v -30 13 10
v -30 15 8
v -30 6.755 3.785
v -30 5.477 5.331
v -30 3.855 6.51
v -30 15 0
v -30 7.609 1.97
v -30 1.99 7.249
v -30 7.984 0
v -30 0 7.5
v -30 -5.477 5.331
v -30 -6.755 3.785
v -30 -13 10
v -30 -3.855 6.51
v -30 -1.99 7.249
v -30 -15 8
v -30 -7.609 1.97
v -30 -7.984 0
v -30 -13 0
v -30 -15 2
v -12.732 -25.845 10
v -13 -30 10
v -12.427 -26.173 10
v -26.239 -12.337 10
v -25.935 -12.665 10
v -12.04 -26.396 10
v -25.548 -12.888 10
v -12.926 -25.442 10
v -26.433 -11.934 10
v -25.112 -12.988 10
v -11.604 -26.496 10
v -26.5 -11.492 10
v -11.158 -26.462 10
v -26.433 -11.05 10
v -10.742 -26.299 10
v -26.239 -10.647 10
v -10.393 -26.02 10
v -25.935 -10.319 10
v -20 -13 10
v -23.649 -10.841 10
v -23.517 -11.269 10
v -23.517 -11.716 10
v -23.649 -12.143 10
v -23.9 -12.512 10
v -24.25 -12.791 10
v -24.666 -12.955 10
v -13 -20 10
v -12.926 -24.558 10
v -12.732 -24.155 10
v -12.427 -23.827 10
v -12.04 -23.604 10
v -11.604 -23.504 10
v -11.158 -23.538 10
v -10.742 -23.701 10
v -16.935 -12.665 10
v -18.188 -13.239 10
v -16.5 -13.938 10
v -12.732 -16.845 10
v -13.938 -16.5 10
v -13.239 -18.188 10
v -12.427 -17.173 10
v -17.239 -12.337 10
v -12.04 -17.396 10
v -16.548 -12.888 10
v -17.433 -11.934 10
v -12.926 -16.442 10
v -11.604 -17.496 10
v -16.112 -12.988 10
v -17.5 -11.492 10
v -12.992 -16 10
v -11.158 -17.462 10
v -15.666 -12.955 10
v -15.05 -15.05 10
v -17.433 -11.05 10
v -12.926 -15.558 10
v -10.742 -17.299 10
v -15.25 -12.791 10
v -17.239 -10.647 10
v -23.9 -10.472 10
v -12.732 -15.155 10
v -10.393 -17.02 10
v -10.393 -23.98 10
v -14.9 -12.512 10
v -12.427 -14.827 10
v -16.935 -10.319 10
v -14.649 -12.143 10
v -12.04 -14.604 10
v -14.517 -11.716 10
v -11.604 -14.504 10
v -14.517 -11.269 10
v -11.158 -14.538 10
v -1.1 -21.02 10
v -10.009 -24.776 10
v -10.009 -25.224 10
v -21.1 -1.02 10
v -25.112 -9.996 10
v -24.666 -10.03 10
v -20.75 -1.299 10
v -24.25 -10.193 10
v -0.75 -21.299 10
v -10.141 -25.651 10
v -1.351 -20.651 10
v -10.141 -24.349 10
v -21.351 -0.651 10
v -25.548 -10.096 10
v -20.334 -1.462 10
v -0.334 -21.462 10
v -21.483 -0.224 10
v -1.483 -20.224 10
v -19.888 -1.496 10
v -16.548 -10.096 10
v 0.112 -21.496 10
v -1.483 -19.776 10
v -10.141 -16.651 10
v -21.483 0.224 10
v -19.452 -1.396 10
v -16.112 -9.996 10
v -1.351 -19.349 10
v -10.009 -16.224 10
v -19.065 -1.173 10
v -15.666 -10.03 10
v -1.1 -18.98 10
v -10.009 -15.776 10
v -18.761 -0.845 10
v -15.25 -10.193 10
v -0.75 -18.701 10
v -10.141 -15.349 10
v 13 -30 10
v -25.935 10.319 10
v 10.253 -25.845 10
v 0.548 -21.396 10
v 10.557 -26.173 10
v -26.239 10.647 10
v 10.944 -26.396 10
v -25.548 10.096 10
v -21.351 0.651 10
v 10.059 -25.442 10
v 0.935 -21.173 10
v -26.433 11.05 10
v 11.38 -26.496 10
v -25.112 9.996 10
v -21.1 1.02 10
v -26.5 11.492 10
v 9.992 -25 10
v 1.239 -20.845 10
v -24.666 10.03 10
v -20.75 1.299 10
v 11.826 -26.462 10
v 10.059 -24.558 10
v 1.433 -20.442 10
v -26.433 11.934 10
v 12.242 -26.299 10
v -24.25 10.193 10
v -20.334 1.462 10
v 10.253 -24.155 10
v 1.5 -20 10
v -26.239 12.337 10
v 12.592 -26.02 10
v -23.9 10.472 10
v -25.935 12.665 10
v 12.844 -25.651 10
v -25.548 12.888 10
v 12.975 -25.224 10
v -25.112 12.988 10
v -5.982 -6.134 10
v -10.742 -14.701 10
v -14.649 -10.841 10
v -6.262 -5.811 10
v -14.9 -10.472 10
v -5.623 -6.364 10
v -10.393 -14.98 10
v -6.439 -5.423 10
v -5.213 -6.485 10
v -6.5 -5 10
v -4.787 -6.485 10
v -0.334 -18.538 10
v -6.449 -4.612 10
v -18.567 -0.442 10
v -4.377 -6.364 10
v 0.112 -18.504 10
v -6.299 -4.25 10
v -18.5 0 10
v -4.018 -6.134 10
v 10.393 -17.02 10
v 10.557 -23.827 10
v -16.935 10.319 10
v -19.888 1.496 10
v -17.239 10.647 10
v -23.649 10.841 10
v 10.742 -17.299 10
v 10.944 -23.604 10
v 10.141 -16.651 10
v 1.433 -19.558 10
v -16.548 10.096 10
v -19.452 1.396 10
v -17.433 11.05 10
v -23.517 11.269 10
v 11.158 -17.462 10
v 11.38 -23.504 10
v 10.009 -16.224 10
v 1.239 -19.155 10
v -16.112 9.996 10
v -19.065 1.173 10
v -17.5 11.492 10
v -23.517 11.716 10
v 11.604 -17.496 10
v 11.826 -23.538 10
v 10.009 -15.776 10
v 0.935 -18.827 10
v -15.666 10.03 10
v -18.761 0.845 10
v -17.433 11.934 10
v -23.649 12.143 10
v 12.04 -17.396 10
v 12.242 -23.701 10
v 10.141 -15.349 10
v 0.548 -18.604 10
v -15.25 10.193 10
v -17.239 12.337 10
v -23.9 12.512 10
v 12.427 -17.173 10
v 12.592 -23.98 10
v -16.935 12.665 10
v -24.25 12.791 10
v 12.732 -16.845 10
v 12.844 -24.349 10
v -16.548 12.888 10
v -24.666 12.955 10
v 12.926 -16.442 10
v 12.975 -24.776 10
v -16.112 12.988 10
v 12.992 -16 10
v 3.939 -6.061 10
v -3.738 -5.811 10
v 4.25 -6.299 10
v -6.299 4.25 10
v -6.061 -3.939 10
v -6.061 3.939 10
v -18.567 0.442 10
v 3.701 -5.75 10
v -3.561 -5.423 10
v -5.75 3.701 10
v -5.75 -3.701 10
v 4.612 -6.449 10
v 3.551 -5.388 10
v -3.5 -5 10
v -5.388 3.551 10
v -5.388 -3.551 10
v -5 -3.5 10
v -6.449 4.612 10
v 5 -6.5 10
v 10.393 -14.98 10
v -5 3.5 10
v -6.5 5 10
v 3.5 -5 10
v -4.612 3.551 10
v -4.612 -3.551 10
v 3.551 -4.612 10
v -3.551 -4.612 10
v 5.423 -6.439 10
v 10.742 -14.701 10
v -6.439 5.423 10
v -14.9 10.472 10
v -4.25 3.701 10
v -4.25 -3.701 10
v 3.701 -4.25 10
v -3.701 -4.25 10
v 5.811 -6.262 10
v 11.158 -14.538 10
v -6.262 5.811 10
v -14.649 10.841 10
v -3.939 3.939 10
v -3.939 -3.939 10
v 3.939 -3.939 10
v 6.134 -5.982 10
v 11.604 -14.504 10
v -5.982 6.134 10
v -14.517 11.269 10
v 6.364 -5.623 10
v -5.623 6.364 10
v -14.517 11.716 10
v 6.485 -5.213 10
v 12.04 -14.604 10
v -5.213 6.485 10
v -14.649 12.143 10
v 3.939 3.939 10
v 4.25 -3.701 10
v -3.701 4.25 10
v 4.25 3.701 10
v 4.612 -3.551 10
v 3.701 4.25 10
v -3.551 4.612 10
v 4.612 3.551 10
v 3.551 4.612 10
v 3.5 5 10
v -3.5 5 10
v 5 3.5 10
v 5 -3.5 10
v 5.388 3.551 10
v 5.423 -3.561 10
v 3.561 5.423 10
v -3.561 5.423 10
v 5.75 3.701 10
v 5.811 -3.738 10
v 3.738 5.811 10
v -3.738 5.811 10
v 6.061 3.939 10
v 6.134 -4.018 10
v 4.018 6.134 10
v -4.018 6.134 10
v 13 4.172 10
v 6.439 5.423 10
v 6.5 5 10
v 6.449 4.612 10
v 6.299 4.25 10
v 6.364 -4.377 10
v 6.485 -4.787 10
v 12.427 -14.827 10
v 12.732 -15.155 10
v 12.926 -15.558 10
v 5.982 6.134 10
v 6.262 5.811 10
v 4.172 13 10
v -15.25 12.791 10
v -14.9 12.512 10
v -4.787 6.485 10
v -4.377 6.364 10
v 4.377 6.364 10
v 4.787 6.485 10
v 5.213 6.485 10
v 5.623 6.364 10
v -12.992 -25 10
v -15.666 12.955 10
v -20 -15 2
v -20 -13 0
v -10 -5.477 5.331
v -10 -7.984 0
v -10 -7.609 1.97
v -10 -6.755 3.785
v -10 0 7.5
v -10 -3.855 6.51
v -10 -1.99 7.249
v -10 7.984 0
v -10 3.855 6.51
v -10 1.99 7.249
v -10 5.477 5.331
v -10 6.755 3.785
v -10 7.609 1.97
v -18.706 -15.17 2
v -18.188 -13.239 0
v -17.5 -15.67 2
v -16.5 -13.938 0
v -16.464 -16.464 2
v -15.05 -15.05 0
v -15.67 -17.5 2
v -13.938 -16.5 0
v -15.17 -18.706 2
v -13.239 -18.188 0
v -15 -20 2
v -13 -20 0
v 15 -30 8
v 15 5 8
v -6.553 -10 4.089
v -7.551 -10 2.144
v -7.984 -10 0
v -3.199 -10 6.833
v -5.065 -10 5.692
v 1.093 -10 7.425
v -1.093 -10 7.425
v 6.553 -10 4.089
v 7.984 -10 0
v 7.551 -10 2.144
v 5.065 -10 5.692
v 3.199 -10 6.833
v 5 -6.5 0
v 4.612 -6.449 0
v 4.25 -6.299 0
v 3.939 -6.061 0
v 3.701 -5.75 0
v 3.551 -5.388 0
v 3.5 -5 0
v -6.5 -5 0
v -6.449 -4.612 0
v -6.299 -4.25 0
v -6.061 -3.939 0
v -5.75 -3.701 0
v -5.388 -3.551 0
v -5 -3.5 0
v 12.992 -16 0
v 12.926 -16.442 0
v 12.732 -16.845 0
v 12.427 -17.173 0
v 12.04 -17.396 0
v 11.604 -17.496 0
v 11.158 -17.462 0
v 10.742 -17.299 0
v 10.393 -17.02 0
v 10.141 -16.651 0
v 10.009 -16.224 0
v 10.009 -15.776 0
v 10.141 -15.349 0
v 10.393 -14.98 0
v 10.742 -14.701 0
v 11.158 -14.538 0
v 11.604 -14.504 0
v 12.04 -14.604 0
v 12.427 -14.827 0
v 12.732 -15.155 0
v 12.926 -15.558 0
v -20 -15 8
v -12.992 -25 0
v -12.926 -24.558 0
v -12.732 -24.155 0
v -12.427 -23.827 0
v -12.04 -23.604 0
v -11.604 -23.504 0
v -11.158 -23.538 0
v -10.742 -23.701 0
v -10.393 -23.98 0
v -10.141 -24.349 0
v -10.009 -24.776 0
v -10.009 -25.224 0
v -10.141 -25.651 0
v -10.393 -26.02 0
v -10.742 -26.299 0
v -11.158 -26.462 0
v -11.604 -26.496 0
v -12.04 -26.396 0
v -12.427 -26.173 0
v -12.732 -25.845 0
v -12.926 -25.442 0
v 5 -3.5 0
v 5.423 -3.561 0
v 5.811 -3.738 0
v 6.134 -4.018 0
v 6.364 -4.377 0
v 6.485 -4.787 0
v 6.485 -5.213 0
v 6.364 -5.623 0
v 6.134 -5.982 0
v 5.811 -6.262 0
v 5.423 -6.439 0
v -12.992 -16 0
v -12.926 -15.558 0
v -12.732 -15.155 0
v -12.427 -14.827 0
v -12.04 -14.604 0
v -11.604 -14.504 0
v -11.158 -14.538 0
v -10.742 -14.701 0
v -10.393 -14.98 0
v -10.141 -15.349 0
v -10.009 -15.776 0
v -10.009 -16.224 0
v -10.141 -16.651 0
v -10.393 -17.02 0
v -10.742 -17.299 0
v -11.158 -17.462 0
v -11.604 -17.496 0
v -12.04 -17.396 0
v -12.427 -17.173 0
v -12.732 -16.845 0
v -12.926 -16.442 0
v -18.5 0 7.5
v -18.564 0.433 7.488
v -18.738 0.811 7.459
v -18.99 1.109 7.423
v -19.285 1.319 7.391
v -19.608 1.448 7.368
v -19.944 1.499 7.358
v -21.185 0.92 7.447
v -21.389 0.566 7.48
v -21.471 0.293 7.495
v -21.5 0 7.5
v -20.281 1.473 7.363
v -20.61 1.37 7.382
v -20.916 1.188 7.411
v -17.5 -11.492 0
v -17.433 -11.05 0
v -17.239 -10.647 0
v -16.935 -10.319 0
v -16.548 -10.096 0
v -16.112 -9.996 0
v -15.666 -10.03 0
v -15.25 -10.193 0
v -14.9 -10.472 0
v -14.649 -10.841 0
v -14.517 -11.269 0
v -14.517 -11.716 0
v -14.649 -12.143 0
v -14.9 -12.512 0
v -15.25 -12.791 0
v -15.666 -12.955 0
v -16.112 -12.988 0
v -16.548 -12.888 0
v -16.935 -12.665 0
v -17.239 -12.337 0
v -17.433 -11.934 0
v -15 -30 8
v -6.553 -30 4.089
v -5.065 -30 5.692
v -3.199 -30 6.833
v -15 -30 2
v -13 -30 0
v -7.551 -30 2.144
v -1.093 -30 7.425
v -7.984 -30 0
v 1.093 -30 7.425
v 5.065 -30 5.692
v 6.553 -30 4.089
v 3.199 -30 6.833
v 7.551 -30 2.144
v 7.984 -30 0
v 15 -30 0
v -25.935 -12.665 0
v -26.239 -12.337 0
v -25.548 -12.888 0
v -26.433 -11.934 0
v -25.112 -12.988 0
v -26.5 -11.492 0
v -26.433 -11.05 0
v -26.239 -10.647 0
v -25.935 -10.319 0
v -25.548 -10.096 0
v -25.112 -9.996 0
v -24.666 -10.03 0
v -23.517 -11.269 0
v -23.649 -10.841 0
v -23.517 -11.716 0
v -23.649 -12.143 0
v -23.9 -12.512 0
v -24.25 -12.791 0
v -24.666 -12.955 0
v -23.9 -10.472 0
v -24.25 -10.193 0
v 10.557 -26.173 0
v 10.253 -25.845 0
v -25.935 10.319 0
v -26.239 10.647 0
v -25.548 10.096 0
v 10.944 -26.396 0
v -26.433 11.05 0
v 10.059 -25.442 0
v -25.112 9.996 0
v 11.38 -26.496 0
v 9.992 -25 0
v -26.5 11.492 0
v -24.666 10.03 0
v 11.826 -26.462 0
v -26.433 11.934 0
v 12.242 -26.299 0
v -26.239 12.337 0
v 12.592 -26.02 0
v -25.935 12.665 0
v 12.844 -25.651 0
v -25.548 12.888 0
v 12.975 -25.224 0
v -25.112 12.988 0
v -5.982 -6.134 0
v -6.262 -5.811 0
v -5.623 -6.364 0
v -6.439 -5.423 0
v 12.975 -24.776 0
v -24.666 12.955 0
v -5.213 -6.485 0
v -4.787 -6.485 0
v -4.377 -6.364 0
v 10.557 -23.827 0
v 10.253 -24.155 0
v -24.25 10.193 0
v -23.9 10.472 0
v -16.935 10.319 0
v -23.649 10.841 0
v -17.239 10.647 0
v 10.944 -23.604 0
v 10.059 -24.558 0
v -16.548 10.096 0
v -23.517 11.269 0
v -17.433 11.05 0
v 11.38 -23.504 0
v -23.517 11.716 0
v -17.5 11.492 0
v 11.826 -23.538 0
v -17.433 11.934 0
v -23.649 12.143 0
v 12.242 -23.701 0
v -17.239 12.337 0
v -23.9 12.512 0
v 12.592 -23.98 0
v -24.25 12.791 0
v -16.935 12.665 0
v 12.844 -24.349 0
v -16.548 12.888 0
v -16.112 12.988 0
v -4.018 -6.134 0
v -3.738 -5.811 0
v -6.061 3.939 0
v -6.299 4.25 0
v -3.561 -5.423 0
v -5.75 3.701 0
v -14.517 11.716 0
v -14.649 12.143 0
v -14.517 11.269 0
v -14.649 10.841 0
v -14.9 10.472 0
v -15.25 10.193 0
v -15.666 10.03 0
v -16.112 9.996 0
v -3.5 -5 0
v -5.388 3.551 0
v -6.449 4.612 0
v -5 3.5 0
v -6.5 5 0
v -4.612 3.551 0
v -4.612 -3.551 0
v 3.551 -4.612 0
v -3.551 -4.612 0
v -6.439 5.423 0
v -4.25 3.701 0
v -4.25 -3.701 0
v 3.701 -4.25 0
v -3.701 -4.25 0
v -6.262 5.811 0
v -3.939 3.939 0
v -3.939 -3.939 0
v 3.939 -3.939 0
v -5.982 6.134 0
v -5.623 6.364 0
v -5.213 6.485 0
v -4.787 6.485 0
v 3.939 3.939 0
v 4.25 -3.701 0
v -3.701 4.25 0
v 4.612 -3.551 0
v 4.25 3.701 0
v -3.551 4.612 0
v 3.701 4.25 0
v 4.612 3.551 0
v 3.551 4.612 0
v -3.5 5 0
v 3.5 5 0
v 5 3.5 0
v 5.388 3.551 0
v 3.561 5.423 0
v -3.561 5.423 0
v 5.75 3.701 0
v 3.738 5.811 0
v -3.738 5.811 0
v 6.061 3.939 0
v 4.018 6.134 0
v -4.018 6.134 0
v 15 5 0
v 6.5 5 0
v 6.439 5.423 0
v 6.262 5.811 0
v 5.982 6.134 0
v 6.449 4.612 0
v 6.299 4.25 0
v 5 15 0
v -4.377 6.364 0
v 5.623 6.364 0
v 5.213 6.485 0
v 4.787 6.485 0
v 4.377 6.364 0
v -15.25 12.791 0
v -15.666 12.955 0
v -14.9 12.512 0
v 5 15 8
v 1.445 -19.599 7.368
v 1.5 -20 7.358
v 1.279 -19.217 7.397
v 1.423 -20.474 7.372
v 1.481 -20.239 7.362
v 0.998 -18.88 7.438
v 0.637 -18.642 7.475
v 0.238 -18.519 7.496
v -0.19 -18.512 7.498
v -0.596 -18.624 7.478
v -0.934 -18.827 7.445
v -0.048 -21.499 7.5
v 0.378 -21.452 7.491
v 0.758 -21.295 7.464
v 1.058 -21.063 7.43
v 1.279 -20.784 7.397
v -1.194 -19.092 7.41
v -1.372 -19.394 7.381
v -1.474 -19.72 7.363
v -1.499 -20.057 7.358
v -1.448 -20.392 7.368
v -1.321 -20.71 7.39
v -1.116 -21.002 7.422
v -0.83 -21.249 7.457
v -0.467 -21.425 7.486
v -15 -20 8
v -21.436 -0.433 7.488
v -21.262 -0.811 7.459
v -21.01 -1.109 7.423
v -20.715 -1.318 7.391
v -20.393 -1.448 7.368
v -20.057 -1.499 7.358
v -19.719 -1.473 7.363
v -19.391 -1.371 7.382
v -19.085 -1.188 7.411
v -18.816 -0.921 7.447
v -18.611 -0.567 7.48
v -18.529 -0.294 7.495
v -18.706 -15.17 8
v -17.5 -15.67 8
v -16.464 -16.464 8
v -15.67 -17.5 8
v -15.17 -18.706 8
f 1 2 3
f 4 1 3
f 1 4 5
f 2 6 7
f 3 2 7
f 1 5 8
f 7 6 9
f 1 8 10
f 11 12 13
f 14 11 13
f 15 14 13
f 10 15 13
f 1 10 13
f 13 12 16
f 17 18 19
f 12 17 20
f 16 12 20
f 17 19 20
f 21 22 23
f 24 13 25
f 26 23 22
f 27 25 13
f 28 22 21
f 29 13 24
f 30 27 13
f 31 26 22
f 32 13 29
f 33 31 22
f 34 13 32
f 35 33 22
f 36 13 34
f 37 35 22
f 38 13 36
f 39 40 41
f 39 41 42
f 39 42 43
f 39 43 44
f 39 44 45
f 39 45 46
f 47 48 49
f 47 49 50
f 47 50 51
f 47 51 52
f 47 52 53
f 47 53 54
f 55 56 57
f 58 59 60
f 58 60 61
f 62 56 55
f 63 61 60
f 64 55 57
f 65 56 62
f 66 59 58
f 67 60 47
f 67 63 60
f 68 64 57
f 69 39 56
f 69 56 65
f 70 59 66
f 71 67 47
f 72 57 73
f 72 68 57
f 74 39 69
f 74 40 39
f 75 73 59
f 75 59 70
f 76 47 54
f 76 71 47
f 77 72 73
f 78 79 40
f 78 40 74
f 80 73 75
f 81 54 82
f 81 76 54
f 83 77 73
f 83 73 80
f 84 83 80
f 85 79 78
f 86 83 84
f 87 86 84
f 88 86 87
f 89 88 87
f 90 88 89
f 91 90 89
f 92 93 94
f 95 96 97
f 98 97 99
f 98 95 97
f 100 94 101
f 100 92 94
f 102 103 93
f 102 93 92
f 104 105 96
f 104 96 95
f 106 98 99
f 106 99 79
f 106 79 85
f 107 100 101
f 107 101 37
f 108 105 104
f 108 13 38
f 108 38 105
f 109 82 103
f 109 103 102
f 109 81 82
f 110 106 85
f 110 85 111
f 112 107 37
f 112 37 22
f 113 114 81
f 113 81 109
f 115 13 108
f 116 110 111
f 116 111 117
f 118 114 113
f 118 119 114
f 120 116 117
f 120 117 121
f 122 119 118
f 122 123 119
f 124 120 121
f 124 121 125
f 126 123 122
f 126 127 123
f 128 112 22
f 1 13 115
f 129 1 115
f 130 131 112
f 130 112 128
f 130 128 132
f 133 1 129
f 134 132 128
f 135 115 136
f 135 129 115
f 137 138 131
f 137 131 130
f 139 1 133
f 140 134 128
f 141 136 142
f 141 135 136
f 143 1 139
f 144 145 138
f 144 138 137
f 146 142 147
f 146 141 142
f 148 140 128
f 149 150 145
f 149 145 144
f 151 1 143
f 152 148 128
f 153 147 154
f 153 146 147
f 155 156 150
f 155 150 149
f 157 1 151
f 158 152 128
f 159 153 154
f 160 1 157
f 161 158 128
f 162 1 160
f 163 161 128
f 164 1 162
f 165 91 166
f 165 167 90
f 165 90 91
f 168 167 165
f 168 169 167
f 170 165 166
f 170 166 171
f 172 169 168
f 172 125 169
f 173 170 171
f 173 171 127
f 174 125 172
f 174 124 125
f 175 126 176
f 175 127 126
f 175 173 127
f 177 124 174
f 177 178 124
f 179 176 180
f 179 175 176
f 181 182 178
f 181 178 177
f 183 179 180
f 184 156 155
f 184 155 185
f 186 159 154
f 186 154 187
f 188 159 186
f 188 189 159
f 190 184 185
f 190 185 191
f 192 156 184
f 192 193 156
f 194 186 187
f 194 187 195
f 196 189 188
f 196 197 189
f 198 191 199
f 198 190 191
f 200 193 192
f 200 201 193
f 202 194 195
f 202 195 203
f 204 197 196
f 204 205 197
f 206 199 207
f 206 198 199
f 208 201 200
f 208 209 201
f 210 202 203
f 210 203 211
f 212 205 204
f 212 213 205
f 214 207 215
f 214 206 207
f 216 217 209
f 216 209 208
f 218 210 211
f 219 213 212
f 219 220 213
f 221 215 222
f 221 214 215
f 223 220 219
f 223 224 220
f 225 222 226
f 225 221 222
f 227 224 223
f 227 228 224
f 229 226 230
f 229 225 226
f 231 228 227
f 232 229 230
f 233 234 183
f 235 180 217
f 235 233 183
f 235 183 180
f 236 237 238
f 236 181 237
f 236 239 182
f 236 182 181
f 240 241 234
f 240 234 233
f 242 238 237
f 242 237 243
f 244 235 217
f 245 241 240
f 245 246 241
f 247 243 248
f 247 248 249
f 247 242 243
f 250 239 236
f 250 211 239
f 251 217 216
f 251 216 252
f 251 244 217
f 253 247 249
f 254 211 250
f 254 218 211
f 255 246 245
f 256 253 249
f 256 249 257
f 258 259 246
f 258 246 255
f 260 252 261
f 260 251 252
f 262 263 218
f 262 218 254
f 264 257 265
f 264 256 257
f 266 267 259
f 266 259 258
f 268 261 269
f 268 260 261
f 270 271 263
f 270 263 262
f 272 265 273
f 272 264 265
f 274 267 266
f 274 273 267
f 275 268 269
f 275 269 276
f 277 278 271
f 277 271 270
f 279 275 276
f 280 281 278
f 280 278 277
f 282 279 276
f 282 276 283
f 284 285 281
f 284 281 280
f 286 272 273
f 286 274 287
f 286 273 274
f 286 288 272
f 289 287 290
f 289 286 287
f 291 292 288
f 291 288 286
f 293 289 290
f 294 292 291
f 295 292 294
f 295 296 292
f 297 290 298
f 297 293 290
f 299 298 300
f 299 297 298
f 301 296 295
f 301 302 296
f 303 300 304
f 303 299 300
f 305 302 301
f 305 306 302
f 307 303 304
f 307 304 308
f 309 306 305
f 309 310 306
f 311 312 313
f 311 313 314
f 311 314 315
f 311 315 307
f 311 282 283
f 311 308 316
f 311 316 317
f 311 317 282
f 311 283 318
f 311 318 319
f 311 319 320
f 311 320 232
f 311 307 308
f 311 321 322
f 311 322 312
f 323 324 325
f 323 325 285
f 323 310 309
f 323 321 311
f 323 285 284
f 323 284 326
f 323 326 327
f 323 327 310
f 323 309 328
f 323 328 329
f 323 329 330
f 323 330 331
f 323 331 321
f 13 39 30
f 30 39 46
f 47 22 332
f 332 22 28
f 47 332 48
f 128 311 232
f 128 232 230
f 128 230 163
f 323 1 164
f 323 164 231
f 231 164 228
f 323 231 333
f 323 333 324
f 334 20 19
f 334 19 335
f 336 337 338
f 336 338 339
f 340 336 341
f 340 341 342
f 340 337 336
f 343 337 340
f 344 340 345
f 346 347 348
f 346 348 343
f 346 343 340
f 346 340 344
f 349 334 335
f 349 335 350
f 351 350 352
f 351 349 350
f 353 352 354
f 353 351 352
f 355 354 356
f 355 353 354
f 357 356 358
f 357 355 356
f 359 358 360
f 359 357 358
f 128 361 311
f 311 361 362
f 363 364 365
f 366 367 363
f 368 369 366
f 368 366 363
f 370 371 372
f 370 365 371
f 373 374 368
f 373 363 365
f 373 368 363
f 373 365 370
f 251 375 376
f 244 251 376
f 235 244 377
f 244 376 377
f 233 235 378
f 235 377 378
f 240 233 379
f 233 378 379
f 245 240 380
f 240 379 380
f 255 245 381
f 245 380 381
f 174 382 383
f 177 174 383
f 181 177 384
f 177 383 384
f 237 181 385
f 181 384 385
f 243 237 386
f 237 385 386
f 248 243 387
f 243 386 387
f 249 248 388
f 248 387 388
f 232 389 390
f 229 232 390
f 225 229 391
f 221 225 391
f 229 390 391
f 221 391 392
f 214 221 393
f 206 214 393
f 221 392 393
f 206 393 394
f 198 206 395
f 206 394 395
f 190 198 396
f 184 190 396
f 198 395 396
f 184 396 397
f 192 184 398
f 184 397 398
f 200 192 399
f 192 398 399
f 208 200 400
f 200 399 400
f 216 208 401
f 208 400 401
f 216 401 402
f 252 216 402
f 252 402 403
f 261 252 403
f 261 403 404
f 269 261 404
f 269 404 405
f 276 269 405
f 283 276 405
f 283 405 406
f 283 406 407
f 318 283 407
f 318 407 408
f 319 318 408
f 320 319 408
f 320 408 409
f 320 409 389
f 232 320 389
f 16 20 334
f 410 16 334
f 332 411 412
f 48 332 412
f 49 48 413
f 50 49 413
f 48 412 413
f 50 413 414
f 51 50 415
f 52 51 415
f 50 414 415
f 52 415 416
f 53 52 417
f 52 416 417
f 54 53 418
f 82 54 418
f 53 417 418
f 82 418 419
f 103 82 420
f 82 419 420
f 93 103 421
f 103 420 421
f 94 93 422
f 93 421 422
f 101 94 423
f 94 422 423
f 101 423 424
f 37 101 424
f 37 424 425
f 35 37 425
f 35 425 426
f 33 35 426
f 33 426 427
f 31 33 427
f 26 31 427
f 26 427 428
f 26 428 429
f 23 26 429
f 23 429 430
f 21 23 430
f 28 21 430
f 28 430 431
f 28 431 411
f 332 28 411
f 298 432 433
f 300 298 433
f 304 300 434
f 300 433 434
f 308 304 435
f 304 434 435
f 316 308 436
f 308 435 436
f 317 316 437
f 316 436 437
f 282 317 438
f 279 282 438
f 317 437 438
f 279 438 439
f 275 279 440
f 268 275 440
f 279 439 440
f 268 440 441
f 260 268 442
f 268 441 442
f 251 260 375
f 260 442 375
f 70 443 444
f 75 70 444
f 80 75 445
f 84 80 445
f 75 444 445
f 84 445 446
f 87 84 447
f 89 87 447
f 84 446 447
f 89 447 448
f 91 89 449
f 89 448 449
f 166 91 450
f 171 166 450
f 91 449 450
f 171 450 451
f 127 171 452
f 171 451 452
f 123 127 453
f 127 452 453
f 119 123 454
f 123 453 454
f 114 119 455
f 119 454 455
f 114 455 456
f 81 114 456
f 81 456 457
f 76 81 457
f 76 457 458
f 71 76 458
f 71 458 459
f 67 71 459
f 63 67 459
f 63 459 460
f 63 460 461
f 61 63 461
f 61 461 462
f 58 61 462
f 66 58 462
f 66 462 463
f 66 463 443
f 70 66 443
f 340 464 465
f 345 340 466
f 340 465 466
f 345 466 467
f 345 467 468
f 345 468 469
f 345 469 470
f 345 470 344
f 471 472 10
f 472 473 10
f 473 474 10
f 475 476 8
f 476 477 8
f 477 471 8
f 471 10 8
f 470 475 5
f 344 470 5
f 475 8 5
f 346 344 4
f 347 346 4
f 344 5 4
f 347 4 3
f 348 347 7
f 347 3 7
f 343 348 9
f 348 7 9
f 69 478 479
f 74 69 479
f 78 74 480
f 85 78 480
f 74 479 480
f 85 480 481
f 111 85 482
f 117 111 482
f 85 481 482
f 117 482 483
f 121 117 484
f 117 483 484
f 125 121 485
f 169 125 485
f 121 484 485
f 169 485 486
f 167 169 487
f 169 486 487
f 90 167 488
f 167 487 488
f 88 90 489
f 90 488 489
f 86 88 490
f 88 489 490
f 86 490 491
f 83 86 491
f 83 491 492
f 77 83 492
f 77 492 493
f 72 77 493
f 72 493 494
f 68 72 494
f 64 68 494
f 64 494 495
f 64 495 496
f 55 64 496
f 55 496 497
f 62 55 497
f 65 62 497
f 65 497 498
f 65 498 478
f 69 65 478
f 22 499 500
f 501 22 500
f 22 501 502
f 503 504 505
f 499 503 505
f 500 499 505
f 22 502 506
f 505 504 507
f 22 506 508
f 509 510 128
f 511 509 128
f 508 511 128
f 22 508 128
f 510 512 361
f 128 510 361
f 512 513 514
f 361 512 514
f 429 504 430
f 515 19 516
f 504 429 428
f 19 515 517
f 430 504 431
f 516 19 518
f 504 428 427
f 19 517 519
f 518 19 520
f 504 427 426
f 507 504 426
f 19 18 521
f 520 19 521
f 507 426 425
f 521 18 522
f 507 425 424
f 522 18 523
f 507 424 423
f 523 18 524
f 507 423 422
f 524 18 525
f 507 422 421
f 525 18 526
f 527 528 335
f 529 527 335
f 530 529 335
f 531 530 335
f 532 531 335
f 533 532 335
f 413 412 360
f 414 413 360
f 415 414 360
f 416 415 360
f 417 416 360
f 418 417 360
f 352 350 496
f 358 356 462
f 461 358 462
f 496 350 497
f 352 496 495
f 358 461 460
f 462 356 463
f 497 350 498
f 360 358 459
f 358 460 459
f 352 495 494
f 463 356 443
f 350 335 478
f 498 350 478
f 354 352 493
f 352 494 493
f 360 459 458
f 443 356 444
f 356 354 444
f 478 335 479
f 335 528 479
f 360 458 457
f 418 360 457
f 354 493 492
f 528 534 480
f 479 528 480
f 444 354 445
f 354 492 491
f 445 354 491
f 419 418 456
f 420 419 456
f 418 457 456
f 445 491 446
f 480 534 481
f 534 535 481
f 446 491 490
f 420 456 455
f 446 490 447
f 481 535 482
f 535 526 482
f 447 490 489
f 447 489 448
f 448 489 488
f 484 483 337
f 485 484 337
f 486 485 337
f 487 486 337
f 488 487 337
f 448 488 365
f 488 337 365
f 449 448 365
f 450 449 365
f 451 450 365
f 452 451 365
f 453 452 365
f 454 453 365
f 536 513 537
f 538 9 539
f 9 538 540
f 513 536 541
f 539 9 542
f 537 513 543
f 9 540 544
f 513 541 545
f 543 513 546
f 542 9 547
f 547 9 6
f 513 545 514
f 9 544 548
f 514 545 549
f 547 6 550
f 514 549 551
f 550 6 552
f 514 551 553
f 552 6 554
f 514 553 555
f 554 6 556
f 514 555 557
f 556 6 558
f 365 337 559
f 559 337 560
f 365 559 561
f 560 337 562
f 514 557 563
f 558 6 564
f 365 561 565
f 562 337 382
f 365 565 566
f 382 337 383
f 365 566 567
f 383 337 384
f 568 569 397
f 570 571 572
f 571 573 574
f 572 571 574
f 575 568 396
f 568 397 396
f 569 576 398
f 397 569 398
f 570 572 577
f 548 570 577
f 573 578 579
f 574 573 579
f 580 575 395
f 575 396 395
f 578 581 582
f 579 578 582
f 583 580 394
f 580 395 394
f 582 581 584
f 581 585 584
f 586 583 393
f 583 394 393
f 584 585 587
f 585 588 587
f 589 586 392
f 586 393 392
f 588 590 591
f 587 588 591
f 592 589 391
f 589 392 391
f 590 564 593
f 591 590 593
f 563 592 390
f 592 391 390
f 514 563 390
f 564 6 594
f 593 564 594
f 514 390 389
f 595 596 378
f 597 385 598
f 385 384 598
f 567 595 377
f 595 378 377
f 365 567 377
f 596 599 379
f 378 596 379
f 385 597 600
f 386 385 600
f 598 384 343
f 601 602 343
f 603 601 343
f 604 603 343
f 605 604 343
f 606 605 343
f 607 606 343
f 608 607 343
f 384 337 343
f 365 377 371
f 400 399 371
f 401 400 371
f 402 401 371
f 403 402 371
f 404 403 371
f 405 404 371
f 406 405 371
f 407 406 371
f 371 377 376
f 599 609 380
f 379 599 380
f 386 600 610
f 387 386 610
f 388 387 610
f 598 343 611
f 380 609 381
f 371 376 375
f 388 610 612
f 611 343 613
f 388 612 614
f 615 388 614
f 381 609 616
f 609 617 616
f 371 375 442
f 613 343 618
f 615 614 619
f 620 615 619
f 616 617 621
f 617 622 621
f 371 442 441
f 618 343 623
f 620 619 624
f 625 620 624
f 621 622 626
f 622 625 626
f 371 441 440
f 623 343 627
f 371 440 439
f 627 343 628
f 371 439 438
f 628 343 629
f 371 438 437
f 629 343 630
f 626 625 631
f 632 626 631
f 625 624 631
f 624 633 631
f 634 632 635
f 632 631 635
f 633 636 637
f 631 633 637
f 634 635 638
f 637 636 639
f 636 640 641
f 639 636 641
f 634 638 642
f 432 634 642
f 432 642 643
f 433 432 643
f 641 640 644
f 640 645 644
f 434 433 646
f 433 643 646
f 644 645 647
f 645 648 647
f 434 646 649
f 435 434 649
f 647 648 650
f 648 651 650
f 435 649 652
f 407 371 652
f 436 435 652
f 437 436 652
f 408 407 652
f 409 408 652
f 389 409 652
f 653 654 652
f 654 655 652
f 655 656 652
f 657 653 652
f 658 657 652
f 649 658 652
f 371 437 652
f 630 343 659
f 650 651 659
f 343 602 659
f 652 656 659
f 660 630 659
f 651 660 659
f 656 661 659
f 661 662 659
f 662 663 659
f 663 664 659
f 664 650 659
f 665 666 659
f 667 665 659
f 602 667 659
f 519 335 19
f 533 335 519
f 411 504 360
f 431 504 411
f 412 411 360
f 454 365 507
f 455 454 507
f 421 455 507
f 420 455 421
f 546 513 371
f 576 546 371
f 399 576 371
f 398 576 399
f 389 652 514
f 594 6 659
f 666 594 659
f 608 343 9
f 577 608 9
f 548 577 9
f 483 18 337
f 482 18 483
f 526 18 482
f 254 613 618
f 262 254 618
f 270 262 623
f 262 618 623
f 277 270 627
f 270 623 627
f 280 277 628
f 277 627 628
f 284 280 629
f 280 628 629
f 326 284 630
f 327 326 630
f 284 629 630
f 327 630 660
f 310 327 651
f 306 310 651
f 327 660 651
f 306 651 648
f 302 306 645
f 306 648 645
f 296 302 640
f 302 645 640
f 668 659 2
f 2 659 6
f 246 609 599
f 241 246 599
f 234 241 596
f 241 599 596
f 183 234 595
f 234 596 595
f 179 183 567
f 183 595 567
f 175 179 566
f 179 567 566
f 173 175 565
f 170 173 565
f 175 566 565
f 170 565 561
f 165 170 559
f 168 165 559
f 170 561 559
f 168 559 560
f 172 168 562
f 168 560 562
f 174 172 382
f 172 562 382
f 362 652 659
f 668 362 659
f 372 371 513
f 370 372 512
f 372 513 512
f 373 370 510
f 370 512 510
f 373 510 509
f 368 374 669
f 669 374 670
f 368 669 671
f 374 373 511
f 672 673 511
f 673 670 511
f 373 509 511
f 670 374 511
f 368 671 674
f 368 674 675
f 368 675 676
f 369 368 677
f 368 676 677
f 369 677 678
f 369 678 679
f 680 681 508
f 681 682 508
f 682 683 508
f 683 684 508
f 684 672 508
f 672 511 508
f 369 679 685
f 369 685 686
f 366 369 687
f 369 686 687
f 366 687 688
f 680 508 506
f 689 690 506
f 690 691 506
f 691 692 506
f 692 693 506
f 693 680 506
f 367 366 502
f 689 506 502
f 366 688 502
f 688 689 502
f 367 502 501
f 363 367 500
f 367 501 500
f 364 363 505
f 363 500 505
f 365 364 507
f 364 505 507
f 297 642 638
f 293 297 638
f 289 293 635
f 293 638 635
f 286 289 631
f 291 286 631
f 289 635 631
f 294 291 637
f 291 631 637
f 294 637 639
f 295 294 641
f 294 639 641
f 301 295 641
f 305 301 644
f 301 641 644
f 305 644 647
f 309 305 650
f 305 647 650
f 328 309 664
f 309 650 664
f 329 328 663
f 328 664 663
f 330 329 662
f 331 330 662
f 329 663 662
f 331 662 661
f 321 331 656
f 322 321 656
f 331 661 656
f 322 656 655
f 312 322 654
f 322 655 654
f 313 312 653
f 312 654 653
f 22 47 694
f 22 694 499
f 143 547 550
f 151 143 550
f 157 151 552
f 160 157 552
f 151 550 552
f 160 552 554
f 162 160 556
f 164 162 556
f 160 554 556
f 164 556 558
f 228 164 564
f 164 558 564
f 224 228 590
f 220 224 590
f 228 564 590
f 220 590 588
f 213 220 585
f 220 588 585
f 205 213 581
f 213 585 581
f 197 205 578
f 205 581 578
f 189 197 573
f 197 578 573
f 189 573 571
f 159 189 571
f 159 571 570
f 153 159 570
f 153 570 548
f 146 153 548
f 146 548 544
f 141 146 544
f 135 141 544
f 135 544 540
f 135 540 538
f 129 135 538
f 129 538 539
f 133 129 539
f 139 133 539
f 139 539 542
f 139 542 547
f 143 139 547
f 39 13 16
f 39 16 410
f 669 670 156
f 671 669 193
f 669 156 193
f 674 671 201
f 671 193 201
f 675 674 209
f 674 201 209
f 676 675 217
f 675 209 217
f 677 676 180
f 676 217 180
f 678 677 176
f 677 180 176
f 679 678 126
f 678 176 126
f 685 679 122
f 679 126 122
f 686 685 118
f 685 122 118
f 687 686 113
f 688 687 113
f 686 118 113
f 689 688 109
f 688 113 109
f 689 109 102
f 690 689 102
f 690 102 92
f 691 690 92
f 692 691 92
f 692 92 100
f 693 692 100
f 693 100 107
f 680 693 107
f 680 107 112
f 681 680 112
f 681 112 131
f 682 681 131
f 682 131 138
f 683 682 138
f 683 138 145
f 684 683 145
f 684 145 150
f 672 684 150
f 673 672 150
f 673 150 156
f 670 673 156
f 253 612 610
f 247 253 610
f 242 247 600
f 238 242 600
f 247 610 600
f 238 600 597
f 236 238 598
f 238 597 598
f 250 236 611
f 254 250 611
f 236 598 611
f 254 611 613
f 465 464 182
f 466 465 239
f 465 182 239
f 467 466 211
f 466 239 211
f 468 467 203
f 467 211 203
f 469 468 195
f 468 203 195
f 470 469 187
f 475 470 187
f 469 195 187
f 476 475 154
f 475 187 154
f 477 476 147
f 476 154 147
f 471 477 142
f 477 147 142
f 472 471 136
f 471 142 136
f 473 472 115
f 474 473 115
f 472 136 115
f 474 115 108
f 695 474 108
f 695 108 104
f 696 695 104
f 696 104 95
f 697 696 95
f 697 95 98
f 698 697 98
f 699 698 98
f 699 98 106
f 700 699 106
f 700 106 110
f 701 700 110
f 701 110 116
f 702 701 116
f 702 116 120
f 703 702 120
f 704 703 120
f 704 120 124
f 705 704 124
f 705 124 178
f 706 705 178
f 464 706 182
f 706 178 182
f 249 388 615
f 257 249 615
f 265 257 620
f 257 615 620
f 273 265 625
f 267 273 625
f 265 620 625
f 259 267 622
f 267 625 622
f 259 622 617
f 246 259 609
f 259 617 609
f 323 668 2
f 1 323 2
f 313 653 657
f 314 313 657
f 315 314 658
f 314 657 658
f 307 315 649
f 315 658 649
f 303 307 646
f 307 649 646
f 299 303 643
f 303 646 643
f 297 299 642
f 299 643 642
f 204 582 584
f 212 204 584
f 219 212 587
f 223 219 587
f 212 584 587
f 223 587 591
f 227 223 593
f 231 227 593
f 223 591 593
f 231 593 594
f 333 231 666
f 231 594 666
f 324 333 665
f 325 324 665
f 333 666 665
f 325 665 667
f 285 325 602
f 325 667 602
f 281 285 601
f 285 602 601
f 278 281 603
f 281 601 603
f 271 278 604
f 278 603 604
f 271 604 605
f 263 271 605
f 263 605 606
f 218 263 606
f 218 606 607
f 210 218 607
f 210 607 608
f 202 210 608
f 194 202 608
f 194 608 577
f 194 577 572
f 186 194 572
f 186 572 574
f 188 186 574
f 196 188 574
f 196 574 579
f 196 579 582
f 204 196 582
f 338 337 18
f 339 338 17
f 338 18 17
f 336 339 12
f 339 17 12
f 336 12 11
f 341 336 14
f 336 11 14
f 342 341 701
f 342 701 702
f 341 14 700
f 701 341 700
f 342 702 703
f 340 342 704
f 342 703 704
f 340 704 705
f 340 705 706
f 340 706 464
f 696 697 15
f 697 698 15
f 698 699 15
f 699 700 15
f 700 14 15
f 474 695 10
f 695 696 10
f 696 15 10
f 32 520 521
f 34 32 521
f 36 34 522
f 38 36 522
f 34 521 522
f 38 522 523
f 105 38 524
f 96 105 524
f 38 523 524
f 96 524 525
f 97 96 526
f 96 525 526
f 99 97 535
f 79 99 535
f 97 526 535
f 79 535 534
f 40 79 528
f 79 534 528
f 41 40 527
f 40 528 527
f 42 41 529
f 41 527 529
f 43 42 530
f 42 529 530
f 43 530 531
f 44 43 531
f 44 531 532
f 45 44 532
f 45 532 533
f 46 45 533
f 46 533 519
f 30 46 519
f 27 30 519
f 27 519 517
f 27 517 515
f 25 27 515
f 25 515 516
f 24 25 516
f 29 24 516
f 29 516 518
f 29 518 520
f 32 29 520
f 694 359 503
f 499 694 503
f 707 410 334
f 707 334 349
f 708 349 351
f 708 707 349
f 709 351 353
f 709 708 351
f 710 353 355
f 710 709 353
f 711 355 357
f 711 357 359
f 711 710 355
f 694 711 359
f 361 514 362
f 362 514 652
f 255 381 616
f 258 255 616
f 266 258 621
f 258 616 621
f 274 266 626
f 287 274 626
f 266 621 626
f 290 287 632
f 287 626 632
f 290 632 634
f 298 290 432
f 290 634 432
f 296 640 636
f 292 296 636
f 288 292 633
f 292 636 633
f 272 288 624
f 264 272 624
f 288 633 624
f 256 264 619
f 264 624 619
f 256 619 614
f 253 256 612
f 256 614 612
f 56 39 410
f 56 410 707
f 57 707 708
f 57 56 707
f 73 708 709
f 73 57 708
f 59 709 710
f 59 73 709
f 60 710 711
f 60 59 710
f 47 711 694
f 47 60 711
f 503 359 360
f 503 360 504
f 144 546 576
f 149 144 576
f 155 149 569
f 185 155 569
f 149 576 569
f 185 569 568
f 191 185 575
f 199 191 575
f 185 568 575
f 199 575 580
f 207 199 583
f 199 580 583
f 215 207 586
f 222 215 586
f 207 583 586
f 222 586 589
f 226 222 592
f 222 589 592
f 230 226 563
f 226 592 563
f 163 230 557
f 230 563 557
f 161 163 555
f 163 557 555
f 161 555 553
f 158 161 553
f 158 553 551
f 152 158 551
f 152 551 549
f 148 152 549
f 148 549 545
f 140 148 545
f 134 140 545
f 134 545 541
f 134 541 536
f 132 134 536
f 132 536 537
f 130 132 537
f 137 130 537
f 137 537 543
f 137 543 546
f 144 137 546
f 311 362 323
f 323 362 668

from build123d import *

# Parameters (mm, degrees)
BOSS_EXTRUDE1_DEPTH = 10
CUT_EXTRUDE1_DEPTH  = 20
CUT_EXTRUDE2_DEPTH  = 20
CUT_EXTRUDE3_DEPTH  = 20
SKETCH5_R           = 1.5
CUT_EXTRUDE4_DEPTH  = 20
FILLET1_R           = 5
CHAMFER1_SIZE       = 2
SKETCH6_R           = 1.5
CUT_EXTRUDE5_DEPTH  = 20


with BuildPart() as part:
    # Sketch1 → Boss-Extrude1 (new body)
    with BuildSketch(Plane.XY):
        Polygon((-30, -15), (-15, -15), (-15, -30), (15, -30), (15, 5), (5, 15), (-30, 15), align=None)
        with BuildLine():
            Line((-3.5, 5), (-6.5, 5))
            ThreePointArc((-6.5, 5), (-5, 6.5), (-3.5, 5))
        make_face(mode=Mode.SUBTRACT)
        with BuildLine():
            ThreePointArc((3.5, 5), (5, 6.5), (6.5, 5))
            Line((6.5, 5), (3.5, 5))
        make_face(mode=Mode.SUBTRACT)
    extrude(amount=BOSS_EXTRUDE1_DEPTH)

    # Sketch2 → Cut-Extrude1 (cut)
    with BuildSketch(Plane.XZ.offset(30)):
        with BuildLine():
            Line((0, 0), (7.984359711, 0))
            ThreePointArc((7.984359711, 0), (0, 7.5), (-7.984359711, 0))
            Line((-7.984359711, 0), (0, 0))
        make_face()
    extrude(amount=-CUT_EXTRUDE1_DEPTH, mode=Mode.SUBTRACT)

    # Sketch3 → Cut-Extrude2 (cut)
    with BuildSketch(Plane.ZY.offset(30)):
        with BuildLine():
            ThreePointArc((0, -7.984359711), (5.330951895, -5.477225575), (7.5, 0))
            ThreePointArc((7.5, 0), (5.330951895, 5.477225575), (0, 7.984359711))
            Line((0, 7.984359711), (0, 0))
            Line((0, 0), (0, -7.984359711))
        make_face()
    extrude(amount=-CUT_EXTRUDE2_DEPTH, mode=Mode.SUBTRACT)

    # Sketch4 → Cut-Extrude3 (cut)
    with BuildSketch(Plane(origin=(0, 0, 0), x_dir=(-1, 0, 0), z_dir=(0, 0, -1))):
        with BuildLine():
            ThreePointArc((3.5, 5), (5, 6.5), (6.5, 5))
            Line((6.5, 5), (3.5, 5))
        make_face()
        with BuildLine():
            Line((5, 5), (3.5, 5))
            ThreePointArc((3.5, 5), (3.939339828, 3.939339828), (5, 3.5))
            Line((5, 3.5), (5, 5))
        make_face()
        with BuildLine():
            Line((5, 5), (5, 3.5))
            ThreePointArc((5, 3.5), (6.060660172, 3.939339828), (6.5, 5))
            Line((6.5, 5), (5, 5))
        make_face()
        with BuildLine():
            Line((5, 5), (3.5, 5))
            ThreePointArc((3.5, 5), (3.939339828, 3.939339828), (5, 3.5))
            Line((5, 3.5), (5, 5))
        make_face()
        with BuildLine():
            Line((5, 5), (5, 3.5))
            ThreePointArc((5, 3.5), (6.060660172, 3.939339828), (6.5, 5))
            Line((6.5, 5), (5, 5))
        make_face()
        with BuildLine():
            ThreePointArc((5, -3.5), (3.939339828, -3.939339828), (3.5, -5))
            Line((3.5, -5), (5, -5))
            Line((5, -5), (5, -3.5))
        make_face()
        with BuildLine():
            Line((5, -5), (3.5, -5))
            ThreePointArc((3.5, -5), (5, -6.5), (6.5, -5))
            ThreePointArc((6.5, -5), (6.060660172, -3.939339828), (5, -3.5))
            Line((5, -3.5), (5, -5))
        make_face()
        with BuildLine():
            ThreePointArc((5, -3.5), (3.939339828, -3.939339828), (3.5, -5))
            Line((3.5, -5), (5, -5))
            Line((5, -5), (5, -3.5))
        make_face()
        with BuildLine():
            Line((5, -5), (3.5, -5))
            ThreePointArc((3.5, -5), (5, -6.5), (6.5, -5))
            ThreePointArc((6.5, -5), (6.060660172, -3.939339828), (5, -3.5))
            Line((5, -3.5), (5, -5))
        make_face()
        with BuildLine():
            Line((-5, 6.5), (-5, 5))
            Line((-5, 5), (-3.5, 5))
            ThreePointArc((-3.5, 5), (-3.939339828, 6.060660172), (-5, 6.5))
        make_face()
        with BuildLine():
            Line((-6.5, 5), (-5, 5))
            Line((-5, 5), (-5, 6.5))
            ThreePointArc((-5, 6.5), (-6.060660172, 6.060660172), (-6.5, 5))
        make_face()
        with BuildLine():
            Line((-5, 6.5), (-5, 5))
            Line((-5, 5), (-3.5, 5))
            ThreePointArc((-3.5, 5), (-3.939339828, 6.060660172), (-5, 6.5))
        make_face()
        with BuildLine():
            Line((-6.5, 5), (-5, 5))
            Line((-5, 5), (-5, 6.5))
            ThreePointArc((-5, 6.5), (-6.060660172, 6.060660172), (-6.5, 5))
        make_face()
        with BuildLine():
            ThreePointArc((-6.5, 5), (-6.060660172, 3.939339828), (-5, 3.5))
            Line((-5, 3.5), (-5, 5))
            Line((-5, 5), (-6.5, 5))
        make_face()
        with BuildLine():
            Line((-5, 5), (-5, 3.5))
            ThreePointArc((-5, 3.5), (-3.939339828, 3.939339828), (-3.5, 5))
            Line((-3.5, 5), (-5, 5))
        make_face()
        with BuildLine():
            ThreePointArc((-6.5, 5), (-6.060660172, 3.939339828), (-5, 3.5))
            Line((-5, 3.5), (-5, 5))
            Line((-5, 5), (-6.5, 5))
        make_face()
        with BuildLine():
            Line((-5, 5), (-5, 3.5))
            ThreePointArc((-5, 3.5), (-3.939339828, 3.939339828), (-3.5, 5))
            Line((-3.5, 5), (-5, 5))
        make_face()
        with BuildLine():
            Line((-5, -6.5), (-5, -5))
            Line((-5, -5), (-5, -3.5))
            ThreePointArc((-5, -3.5), (-6.5, -5), (-5, -6.5))
        make_face()
        with BuildLine():
            Line((-5, -3.5), (-5, -5))
            Line((-5, -5), (-3.5, -5))
            ThreePointArc((-3.5, -5), (-3.939339828, -3.939339828), (-5, -3.5))
        make_face()
        with BuildLine():
            Line((-3.5, -5), (-5, -5))
            Line((-5, -5), (-5, -6.5))
            ThreePointArc((-5, -6.5), (-3.939339828, -6.060660172), (-3.5, -5))
        make_face()
        with BuildLine():
            Line((-5, -3.5), (-5, -5))
            Line((-5, -5), (-3.5, -5))
            ThreePointArc((-3.5, -5), (-3.939339828, -3.939339828), (-5, -3.5))
        make_face()
        with BuildLine():
            Line((-3.5, -5), (-5, -5))
            Line((-5, -5), (-5, -6.5))
            ThreePointArc((-5, -6.5), (-3.939339828, -6.060660172), (-3.5, -5))
        make_face()
    extrude(amount=-CUT_EXTRUDE3_DEPTH, mode=Mode.SUBTRACT)

    # Sketch5 → Cut-Extrude4 (cut)
    with BuildSketch(Plane(origin=(0, 0, 0), x_dir=(-1, 0, 0), z_dir=(0, 0, -1))):
        with Locations((25, 11.492179856)):
            Circle(SKETCH5_R)
        with Locations((16, 11.492179856)):
            Circle(SKETCH5_R)
        with Locations((25, -11.492179856)):
            Circle(SKETCH5_R)
        with Locations((16, -11.492179856)):
            Circle(SKETCH5_R)
        with Locations((11.492179856, -16)):
            Circle(SKETCH5_R)
        with Locations((11.492179856, -25)):
            Circle(SKETCH5_R)
        with Locations(Location((-11.492179856, -16, 0), (0, 0, 180))):
            Circle(SKETCH5_R)
        with Locations((-11.492179856, -25)):
            Circle(SKETCH5_R)
    extrude(amount=-CUT_EXTRUDE4_DEPTH, mode=Mode.SUBTRACT)

    # Fillet1
    fillet1_edges = [part.edges().sort_by_distance(p)[0] for p in [
        (-15, -15, 5),
    ]]
    fillet(fillet1_edges, radius=FILLET1_R)

    # Chamfer1
    chamfer1_edges = [part.edges().sort_by_distance(p)[0] for p in [
        (-16.464466094, -16.464466094, 10),
        (-16.464466094, -16.464466094, 0),
        (-25, -15, 0),
        (15, -12.5, 10),
        (10, 10, 10),
        (-12.5, 15, 10),
        (-15, -25, 10),
        (-15, -25, 0),
        (-25, -15, 10),
    ]]
    chamfer(chamfer1_edges, length=CHAMFER1_SIZE)

    # Sketch6 → Cut-Extrude5 (cut)
    with BuildSketch(Plane.XY.offset(10)):
        with Locations((-20, 0)):
            Circle(SKETCH6_R)
        with Locations((0, -20)):
            Circle(SKETCH6_R)
    extrude(amount=-CUT_EXTRUDE5_DEPTH, mode=Mode.SUBTRACT)


solid = part.part
